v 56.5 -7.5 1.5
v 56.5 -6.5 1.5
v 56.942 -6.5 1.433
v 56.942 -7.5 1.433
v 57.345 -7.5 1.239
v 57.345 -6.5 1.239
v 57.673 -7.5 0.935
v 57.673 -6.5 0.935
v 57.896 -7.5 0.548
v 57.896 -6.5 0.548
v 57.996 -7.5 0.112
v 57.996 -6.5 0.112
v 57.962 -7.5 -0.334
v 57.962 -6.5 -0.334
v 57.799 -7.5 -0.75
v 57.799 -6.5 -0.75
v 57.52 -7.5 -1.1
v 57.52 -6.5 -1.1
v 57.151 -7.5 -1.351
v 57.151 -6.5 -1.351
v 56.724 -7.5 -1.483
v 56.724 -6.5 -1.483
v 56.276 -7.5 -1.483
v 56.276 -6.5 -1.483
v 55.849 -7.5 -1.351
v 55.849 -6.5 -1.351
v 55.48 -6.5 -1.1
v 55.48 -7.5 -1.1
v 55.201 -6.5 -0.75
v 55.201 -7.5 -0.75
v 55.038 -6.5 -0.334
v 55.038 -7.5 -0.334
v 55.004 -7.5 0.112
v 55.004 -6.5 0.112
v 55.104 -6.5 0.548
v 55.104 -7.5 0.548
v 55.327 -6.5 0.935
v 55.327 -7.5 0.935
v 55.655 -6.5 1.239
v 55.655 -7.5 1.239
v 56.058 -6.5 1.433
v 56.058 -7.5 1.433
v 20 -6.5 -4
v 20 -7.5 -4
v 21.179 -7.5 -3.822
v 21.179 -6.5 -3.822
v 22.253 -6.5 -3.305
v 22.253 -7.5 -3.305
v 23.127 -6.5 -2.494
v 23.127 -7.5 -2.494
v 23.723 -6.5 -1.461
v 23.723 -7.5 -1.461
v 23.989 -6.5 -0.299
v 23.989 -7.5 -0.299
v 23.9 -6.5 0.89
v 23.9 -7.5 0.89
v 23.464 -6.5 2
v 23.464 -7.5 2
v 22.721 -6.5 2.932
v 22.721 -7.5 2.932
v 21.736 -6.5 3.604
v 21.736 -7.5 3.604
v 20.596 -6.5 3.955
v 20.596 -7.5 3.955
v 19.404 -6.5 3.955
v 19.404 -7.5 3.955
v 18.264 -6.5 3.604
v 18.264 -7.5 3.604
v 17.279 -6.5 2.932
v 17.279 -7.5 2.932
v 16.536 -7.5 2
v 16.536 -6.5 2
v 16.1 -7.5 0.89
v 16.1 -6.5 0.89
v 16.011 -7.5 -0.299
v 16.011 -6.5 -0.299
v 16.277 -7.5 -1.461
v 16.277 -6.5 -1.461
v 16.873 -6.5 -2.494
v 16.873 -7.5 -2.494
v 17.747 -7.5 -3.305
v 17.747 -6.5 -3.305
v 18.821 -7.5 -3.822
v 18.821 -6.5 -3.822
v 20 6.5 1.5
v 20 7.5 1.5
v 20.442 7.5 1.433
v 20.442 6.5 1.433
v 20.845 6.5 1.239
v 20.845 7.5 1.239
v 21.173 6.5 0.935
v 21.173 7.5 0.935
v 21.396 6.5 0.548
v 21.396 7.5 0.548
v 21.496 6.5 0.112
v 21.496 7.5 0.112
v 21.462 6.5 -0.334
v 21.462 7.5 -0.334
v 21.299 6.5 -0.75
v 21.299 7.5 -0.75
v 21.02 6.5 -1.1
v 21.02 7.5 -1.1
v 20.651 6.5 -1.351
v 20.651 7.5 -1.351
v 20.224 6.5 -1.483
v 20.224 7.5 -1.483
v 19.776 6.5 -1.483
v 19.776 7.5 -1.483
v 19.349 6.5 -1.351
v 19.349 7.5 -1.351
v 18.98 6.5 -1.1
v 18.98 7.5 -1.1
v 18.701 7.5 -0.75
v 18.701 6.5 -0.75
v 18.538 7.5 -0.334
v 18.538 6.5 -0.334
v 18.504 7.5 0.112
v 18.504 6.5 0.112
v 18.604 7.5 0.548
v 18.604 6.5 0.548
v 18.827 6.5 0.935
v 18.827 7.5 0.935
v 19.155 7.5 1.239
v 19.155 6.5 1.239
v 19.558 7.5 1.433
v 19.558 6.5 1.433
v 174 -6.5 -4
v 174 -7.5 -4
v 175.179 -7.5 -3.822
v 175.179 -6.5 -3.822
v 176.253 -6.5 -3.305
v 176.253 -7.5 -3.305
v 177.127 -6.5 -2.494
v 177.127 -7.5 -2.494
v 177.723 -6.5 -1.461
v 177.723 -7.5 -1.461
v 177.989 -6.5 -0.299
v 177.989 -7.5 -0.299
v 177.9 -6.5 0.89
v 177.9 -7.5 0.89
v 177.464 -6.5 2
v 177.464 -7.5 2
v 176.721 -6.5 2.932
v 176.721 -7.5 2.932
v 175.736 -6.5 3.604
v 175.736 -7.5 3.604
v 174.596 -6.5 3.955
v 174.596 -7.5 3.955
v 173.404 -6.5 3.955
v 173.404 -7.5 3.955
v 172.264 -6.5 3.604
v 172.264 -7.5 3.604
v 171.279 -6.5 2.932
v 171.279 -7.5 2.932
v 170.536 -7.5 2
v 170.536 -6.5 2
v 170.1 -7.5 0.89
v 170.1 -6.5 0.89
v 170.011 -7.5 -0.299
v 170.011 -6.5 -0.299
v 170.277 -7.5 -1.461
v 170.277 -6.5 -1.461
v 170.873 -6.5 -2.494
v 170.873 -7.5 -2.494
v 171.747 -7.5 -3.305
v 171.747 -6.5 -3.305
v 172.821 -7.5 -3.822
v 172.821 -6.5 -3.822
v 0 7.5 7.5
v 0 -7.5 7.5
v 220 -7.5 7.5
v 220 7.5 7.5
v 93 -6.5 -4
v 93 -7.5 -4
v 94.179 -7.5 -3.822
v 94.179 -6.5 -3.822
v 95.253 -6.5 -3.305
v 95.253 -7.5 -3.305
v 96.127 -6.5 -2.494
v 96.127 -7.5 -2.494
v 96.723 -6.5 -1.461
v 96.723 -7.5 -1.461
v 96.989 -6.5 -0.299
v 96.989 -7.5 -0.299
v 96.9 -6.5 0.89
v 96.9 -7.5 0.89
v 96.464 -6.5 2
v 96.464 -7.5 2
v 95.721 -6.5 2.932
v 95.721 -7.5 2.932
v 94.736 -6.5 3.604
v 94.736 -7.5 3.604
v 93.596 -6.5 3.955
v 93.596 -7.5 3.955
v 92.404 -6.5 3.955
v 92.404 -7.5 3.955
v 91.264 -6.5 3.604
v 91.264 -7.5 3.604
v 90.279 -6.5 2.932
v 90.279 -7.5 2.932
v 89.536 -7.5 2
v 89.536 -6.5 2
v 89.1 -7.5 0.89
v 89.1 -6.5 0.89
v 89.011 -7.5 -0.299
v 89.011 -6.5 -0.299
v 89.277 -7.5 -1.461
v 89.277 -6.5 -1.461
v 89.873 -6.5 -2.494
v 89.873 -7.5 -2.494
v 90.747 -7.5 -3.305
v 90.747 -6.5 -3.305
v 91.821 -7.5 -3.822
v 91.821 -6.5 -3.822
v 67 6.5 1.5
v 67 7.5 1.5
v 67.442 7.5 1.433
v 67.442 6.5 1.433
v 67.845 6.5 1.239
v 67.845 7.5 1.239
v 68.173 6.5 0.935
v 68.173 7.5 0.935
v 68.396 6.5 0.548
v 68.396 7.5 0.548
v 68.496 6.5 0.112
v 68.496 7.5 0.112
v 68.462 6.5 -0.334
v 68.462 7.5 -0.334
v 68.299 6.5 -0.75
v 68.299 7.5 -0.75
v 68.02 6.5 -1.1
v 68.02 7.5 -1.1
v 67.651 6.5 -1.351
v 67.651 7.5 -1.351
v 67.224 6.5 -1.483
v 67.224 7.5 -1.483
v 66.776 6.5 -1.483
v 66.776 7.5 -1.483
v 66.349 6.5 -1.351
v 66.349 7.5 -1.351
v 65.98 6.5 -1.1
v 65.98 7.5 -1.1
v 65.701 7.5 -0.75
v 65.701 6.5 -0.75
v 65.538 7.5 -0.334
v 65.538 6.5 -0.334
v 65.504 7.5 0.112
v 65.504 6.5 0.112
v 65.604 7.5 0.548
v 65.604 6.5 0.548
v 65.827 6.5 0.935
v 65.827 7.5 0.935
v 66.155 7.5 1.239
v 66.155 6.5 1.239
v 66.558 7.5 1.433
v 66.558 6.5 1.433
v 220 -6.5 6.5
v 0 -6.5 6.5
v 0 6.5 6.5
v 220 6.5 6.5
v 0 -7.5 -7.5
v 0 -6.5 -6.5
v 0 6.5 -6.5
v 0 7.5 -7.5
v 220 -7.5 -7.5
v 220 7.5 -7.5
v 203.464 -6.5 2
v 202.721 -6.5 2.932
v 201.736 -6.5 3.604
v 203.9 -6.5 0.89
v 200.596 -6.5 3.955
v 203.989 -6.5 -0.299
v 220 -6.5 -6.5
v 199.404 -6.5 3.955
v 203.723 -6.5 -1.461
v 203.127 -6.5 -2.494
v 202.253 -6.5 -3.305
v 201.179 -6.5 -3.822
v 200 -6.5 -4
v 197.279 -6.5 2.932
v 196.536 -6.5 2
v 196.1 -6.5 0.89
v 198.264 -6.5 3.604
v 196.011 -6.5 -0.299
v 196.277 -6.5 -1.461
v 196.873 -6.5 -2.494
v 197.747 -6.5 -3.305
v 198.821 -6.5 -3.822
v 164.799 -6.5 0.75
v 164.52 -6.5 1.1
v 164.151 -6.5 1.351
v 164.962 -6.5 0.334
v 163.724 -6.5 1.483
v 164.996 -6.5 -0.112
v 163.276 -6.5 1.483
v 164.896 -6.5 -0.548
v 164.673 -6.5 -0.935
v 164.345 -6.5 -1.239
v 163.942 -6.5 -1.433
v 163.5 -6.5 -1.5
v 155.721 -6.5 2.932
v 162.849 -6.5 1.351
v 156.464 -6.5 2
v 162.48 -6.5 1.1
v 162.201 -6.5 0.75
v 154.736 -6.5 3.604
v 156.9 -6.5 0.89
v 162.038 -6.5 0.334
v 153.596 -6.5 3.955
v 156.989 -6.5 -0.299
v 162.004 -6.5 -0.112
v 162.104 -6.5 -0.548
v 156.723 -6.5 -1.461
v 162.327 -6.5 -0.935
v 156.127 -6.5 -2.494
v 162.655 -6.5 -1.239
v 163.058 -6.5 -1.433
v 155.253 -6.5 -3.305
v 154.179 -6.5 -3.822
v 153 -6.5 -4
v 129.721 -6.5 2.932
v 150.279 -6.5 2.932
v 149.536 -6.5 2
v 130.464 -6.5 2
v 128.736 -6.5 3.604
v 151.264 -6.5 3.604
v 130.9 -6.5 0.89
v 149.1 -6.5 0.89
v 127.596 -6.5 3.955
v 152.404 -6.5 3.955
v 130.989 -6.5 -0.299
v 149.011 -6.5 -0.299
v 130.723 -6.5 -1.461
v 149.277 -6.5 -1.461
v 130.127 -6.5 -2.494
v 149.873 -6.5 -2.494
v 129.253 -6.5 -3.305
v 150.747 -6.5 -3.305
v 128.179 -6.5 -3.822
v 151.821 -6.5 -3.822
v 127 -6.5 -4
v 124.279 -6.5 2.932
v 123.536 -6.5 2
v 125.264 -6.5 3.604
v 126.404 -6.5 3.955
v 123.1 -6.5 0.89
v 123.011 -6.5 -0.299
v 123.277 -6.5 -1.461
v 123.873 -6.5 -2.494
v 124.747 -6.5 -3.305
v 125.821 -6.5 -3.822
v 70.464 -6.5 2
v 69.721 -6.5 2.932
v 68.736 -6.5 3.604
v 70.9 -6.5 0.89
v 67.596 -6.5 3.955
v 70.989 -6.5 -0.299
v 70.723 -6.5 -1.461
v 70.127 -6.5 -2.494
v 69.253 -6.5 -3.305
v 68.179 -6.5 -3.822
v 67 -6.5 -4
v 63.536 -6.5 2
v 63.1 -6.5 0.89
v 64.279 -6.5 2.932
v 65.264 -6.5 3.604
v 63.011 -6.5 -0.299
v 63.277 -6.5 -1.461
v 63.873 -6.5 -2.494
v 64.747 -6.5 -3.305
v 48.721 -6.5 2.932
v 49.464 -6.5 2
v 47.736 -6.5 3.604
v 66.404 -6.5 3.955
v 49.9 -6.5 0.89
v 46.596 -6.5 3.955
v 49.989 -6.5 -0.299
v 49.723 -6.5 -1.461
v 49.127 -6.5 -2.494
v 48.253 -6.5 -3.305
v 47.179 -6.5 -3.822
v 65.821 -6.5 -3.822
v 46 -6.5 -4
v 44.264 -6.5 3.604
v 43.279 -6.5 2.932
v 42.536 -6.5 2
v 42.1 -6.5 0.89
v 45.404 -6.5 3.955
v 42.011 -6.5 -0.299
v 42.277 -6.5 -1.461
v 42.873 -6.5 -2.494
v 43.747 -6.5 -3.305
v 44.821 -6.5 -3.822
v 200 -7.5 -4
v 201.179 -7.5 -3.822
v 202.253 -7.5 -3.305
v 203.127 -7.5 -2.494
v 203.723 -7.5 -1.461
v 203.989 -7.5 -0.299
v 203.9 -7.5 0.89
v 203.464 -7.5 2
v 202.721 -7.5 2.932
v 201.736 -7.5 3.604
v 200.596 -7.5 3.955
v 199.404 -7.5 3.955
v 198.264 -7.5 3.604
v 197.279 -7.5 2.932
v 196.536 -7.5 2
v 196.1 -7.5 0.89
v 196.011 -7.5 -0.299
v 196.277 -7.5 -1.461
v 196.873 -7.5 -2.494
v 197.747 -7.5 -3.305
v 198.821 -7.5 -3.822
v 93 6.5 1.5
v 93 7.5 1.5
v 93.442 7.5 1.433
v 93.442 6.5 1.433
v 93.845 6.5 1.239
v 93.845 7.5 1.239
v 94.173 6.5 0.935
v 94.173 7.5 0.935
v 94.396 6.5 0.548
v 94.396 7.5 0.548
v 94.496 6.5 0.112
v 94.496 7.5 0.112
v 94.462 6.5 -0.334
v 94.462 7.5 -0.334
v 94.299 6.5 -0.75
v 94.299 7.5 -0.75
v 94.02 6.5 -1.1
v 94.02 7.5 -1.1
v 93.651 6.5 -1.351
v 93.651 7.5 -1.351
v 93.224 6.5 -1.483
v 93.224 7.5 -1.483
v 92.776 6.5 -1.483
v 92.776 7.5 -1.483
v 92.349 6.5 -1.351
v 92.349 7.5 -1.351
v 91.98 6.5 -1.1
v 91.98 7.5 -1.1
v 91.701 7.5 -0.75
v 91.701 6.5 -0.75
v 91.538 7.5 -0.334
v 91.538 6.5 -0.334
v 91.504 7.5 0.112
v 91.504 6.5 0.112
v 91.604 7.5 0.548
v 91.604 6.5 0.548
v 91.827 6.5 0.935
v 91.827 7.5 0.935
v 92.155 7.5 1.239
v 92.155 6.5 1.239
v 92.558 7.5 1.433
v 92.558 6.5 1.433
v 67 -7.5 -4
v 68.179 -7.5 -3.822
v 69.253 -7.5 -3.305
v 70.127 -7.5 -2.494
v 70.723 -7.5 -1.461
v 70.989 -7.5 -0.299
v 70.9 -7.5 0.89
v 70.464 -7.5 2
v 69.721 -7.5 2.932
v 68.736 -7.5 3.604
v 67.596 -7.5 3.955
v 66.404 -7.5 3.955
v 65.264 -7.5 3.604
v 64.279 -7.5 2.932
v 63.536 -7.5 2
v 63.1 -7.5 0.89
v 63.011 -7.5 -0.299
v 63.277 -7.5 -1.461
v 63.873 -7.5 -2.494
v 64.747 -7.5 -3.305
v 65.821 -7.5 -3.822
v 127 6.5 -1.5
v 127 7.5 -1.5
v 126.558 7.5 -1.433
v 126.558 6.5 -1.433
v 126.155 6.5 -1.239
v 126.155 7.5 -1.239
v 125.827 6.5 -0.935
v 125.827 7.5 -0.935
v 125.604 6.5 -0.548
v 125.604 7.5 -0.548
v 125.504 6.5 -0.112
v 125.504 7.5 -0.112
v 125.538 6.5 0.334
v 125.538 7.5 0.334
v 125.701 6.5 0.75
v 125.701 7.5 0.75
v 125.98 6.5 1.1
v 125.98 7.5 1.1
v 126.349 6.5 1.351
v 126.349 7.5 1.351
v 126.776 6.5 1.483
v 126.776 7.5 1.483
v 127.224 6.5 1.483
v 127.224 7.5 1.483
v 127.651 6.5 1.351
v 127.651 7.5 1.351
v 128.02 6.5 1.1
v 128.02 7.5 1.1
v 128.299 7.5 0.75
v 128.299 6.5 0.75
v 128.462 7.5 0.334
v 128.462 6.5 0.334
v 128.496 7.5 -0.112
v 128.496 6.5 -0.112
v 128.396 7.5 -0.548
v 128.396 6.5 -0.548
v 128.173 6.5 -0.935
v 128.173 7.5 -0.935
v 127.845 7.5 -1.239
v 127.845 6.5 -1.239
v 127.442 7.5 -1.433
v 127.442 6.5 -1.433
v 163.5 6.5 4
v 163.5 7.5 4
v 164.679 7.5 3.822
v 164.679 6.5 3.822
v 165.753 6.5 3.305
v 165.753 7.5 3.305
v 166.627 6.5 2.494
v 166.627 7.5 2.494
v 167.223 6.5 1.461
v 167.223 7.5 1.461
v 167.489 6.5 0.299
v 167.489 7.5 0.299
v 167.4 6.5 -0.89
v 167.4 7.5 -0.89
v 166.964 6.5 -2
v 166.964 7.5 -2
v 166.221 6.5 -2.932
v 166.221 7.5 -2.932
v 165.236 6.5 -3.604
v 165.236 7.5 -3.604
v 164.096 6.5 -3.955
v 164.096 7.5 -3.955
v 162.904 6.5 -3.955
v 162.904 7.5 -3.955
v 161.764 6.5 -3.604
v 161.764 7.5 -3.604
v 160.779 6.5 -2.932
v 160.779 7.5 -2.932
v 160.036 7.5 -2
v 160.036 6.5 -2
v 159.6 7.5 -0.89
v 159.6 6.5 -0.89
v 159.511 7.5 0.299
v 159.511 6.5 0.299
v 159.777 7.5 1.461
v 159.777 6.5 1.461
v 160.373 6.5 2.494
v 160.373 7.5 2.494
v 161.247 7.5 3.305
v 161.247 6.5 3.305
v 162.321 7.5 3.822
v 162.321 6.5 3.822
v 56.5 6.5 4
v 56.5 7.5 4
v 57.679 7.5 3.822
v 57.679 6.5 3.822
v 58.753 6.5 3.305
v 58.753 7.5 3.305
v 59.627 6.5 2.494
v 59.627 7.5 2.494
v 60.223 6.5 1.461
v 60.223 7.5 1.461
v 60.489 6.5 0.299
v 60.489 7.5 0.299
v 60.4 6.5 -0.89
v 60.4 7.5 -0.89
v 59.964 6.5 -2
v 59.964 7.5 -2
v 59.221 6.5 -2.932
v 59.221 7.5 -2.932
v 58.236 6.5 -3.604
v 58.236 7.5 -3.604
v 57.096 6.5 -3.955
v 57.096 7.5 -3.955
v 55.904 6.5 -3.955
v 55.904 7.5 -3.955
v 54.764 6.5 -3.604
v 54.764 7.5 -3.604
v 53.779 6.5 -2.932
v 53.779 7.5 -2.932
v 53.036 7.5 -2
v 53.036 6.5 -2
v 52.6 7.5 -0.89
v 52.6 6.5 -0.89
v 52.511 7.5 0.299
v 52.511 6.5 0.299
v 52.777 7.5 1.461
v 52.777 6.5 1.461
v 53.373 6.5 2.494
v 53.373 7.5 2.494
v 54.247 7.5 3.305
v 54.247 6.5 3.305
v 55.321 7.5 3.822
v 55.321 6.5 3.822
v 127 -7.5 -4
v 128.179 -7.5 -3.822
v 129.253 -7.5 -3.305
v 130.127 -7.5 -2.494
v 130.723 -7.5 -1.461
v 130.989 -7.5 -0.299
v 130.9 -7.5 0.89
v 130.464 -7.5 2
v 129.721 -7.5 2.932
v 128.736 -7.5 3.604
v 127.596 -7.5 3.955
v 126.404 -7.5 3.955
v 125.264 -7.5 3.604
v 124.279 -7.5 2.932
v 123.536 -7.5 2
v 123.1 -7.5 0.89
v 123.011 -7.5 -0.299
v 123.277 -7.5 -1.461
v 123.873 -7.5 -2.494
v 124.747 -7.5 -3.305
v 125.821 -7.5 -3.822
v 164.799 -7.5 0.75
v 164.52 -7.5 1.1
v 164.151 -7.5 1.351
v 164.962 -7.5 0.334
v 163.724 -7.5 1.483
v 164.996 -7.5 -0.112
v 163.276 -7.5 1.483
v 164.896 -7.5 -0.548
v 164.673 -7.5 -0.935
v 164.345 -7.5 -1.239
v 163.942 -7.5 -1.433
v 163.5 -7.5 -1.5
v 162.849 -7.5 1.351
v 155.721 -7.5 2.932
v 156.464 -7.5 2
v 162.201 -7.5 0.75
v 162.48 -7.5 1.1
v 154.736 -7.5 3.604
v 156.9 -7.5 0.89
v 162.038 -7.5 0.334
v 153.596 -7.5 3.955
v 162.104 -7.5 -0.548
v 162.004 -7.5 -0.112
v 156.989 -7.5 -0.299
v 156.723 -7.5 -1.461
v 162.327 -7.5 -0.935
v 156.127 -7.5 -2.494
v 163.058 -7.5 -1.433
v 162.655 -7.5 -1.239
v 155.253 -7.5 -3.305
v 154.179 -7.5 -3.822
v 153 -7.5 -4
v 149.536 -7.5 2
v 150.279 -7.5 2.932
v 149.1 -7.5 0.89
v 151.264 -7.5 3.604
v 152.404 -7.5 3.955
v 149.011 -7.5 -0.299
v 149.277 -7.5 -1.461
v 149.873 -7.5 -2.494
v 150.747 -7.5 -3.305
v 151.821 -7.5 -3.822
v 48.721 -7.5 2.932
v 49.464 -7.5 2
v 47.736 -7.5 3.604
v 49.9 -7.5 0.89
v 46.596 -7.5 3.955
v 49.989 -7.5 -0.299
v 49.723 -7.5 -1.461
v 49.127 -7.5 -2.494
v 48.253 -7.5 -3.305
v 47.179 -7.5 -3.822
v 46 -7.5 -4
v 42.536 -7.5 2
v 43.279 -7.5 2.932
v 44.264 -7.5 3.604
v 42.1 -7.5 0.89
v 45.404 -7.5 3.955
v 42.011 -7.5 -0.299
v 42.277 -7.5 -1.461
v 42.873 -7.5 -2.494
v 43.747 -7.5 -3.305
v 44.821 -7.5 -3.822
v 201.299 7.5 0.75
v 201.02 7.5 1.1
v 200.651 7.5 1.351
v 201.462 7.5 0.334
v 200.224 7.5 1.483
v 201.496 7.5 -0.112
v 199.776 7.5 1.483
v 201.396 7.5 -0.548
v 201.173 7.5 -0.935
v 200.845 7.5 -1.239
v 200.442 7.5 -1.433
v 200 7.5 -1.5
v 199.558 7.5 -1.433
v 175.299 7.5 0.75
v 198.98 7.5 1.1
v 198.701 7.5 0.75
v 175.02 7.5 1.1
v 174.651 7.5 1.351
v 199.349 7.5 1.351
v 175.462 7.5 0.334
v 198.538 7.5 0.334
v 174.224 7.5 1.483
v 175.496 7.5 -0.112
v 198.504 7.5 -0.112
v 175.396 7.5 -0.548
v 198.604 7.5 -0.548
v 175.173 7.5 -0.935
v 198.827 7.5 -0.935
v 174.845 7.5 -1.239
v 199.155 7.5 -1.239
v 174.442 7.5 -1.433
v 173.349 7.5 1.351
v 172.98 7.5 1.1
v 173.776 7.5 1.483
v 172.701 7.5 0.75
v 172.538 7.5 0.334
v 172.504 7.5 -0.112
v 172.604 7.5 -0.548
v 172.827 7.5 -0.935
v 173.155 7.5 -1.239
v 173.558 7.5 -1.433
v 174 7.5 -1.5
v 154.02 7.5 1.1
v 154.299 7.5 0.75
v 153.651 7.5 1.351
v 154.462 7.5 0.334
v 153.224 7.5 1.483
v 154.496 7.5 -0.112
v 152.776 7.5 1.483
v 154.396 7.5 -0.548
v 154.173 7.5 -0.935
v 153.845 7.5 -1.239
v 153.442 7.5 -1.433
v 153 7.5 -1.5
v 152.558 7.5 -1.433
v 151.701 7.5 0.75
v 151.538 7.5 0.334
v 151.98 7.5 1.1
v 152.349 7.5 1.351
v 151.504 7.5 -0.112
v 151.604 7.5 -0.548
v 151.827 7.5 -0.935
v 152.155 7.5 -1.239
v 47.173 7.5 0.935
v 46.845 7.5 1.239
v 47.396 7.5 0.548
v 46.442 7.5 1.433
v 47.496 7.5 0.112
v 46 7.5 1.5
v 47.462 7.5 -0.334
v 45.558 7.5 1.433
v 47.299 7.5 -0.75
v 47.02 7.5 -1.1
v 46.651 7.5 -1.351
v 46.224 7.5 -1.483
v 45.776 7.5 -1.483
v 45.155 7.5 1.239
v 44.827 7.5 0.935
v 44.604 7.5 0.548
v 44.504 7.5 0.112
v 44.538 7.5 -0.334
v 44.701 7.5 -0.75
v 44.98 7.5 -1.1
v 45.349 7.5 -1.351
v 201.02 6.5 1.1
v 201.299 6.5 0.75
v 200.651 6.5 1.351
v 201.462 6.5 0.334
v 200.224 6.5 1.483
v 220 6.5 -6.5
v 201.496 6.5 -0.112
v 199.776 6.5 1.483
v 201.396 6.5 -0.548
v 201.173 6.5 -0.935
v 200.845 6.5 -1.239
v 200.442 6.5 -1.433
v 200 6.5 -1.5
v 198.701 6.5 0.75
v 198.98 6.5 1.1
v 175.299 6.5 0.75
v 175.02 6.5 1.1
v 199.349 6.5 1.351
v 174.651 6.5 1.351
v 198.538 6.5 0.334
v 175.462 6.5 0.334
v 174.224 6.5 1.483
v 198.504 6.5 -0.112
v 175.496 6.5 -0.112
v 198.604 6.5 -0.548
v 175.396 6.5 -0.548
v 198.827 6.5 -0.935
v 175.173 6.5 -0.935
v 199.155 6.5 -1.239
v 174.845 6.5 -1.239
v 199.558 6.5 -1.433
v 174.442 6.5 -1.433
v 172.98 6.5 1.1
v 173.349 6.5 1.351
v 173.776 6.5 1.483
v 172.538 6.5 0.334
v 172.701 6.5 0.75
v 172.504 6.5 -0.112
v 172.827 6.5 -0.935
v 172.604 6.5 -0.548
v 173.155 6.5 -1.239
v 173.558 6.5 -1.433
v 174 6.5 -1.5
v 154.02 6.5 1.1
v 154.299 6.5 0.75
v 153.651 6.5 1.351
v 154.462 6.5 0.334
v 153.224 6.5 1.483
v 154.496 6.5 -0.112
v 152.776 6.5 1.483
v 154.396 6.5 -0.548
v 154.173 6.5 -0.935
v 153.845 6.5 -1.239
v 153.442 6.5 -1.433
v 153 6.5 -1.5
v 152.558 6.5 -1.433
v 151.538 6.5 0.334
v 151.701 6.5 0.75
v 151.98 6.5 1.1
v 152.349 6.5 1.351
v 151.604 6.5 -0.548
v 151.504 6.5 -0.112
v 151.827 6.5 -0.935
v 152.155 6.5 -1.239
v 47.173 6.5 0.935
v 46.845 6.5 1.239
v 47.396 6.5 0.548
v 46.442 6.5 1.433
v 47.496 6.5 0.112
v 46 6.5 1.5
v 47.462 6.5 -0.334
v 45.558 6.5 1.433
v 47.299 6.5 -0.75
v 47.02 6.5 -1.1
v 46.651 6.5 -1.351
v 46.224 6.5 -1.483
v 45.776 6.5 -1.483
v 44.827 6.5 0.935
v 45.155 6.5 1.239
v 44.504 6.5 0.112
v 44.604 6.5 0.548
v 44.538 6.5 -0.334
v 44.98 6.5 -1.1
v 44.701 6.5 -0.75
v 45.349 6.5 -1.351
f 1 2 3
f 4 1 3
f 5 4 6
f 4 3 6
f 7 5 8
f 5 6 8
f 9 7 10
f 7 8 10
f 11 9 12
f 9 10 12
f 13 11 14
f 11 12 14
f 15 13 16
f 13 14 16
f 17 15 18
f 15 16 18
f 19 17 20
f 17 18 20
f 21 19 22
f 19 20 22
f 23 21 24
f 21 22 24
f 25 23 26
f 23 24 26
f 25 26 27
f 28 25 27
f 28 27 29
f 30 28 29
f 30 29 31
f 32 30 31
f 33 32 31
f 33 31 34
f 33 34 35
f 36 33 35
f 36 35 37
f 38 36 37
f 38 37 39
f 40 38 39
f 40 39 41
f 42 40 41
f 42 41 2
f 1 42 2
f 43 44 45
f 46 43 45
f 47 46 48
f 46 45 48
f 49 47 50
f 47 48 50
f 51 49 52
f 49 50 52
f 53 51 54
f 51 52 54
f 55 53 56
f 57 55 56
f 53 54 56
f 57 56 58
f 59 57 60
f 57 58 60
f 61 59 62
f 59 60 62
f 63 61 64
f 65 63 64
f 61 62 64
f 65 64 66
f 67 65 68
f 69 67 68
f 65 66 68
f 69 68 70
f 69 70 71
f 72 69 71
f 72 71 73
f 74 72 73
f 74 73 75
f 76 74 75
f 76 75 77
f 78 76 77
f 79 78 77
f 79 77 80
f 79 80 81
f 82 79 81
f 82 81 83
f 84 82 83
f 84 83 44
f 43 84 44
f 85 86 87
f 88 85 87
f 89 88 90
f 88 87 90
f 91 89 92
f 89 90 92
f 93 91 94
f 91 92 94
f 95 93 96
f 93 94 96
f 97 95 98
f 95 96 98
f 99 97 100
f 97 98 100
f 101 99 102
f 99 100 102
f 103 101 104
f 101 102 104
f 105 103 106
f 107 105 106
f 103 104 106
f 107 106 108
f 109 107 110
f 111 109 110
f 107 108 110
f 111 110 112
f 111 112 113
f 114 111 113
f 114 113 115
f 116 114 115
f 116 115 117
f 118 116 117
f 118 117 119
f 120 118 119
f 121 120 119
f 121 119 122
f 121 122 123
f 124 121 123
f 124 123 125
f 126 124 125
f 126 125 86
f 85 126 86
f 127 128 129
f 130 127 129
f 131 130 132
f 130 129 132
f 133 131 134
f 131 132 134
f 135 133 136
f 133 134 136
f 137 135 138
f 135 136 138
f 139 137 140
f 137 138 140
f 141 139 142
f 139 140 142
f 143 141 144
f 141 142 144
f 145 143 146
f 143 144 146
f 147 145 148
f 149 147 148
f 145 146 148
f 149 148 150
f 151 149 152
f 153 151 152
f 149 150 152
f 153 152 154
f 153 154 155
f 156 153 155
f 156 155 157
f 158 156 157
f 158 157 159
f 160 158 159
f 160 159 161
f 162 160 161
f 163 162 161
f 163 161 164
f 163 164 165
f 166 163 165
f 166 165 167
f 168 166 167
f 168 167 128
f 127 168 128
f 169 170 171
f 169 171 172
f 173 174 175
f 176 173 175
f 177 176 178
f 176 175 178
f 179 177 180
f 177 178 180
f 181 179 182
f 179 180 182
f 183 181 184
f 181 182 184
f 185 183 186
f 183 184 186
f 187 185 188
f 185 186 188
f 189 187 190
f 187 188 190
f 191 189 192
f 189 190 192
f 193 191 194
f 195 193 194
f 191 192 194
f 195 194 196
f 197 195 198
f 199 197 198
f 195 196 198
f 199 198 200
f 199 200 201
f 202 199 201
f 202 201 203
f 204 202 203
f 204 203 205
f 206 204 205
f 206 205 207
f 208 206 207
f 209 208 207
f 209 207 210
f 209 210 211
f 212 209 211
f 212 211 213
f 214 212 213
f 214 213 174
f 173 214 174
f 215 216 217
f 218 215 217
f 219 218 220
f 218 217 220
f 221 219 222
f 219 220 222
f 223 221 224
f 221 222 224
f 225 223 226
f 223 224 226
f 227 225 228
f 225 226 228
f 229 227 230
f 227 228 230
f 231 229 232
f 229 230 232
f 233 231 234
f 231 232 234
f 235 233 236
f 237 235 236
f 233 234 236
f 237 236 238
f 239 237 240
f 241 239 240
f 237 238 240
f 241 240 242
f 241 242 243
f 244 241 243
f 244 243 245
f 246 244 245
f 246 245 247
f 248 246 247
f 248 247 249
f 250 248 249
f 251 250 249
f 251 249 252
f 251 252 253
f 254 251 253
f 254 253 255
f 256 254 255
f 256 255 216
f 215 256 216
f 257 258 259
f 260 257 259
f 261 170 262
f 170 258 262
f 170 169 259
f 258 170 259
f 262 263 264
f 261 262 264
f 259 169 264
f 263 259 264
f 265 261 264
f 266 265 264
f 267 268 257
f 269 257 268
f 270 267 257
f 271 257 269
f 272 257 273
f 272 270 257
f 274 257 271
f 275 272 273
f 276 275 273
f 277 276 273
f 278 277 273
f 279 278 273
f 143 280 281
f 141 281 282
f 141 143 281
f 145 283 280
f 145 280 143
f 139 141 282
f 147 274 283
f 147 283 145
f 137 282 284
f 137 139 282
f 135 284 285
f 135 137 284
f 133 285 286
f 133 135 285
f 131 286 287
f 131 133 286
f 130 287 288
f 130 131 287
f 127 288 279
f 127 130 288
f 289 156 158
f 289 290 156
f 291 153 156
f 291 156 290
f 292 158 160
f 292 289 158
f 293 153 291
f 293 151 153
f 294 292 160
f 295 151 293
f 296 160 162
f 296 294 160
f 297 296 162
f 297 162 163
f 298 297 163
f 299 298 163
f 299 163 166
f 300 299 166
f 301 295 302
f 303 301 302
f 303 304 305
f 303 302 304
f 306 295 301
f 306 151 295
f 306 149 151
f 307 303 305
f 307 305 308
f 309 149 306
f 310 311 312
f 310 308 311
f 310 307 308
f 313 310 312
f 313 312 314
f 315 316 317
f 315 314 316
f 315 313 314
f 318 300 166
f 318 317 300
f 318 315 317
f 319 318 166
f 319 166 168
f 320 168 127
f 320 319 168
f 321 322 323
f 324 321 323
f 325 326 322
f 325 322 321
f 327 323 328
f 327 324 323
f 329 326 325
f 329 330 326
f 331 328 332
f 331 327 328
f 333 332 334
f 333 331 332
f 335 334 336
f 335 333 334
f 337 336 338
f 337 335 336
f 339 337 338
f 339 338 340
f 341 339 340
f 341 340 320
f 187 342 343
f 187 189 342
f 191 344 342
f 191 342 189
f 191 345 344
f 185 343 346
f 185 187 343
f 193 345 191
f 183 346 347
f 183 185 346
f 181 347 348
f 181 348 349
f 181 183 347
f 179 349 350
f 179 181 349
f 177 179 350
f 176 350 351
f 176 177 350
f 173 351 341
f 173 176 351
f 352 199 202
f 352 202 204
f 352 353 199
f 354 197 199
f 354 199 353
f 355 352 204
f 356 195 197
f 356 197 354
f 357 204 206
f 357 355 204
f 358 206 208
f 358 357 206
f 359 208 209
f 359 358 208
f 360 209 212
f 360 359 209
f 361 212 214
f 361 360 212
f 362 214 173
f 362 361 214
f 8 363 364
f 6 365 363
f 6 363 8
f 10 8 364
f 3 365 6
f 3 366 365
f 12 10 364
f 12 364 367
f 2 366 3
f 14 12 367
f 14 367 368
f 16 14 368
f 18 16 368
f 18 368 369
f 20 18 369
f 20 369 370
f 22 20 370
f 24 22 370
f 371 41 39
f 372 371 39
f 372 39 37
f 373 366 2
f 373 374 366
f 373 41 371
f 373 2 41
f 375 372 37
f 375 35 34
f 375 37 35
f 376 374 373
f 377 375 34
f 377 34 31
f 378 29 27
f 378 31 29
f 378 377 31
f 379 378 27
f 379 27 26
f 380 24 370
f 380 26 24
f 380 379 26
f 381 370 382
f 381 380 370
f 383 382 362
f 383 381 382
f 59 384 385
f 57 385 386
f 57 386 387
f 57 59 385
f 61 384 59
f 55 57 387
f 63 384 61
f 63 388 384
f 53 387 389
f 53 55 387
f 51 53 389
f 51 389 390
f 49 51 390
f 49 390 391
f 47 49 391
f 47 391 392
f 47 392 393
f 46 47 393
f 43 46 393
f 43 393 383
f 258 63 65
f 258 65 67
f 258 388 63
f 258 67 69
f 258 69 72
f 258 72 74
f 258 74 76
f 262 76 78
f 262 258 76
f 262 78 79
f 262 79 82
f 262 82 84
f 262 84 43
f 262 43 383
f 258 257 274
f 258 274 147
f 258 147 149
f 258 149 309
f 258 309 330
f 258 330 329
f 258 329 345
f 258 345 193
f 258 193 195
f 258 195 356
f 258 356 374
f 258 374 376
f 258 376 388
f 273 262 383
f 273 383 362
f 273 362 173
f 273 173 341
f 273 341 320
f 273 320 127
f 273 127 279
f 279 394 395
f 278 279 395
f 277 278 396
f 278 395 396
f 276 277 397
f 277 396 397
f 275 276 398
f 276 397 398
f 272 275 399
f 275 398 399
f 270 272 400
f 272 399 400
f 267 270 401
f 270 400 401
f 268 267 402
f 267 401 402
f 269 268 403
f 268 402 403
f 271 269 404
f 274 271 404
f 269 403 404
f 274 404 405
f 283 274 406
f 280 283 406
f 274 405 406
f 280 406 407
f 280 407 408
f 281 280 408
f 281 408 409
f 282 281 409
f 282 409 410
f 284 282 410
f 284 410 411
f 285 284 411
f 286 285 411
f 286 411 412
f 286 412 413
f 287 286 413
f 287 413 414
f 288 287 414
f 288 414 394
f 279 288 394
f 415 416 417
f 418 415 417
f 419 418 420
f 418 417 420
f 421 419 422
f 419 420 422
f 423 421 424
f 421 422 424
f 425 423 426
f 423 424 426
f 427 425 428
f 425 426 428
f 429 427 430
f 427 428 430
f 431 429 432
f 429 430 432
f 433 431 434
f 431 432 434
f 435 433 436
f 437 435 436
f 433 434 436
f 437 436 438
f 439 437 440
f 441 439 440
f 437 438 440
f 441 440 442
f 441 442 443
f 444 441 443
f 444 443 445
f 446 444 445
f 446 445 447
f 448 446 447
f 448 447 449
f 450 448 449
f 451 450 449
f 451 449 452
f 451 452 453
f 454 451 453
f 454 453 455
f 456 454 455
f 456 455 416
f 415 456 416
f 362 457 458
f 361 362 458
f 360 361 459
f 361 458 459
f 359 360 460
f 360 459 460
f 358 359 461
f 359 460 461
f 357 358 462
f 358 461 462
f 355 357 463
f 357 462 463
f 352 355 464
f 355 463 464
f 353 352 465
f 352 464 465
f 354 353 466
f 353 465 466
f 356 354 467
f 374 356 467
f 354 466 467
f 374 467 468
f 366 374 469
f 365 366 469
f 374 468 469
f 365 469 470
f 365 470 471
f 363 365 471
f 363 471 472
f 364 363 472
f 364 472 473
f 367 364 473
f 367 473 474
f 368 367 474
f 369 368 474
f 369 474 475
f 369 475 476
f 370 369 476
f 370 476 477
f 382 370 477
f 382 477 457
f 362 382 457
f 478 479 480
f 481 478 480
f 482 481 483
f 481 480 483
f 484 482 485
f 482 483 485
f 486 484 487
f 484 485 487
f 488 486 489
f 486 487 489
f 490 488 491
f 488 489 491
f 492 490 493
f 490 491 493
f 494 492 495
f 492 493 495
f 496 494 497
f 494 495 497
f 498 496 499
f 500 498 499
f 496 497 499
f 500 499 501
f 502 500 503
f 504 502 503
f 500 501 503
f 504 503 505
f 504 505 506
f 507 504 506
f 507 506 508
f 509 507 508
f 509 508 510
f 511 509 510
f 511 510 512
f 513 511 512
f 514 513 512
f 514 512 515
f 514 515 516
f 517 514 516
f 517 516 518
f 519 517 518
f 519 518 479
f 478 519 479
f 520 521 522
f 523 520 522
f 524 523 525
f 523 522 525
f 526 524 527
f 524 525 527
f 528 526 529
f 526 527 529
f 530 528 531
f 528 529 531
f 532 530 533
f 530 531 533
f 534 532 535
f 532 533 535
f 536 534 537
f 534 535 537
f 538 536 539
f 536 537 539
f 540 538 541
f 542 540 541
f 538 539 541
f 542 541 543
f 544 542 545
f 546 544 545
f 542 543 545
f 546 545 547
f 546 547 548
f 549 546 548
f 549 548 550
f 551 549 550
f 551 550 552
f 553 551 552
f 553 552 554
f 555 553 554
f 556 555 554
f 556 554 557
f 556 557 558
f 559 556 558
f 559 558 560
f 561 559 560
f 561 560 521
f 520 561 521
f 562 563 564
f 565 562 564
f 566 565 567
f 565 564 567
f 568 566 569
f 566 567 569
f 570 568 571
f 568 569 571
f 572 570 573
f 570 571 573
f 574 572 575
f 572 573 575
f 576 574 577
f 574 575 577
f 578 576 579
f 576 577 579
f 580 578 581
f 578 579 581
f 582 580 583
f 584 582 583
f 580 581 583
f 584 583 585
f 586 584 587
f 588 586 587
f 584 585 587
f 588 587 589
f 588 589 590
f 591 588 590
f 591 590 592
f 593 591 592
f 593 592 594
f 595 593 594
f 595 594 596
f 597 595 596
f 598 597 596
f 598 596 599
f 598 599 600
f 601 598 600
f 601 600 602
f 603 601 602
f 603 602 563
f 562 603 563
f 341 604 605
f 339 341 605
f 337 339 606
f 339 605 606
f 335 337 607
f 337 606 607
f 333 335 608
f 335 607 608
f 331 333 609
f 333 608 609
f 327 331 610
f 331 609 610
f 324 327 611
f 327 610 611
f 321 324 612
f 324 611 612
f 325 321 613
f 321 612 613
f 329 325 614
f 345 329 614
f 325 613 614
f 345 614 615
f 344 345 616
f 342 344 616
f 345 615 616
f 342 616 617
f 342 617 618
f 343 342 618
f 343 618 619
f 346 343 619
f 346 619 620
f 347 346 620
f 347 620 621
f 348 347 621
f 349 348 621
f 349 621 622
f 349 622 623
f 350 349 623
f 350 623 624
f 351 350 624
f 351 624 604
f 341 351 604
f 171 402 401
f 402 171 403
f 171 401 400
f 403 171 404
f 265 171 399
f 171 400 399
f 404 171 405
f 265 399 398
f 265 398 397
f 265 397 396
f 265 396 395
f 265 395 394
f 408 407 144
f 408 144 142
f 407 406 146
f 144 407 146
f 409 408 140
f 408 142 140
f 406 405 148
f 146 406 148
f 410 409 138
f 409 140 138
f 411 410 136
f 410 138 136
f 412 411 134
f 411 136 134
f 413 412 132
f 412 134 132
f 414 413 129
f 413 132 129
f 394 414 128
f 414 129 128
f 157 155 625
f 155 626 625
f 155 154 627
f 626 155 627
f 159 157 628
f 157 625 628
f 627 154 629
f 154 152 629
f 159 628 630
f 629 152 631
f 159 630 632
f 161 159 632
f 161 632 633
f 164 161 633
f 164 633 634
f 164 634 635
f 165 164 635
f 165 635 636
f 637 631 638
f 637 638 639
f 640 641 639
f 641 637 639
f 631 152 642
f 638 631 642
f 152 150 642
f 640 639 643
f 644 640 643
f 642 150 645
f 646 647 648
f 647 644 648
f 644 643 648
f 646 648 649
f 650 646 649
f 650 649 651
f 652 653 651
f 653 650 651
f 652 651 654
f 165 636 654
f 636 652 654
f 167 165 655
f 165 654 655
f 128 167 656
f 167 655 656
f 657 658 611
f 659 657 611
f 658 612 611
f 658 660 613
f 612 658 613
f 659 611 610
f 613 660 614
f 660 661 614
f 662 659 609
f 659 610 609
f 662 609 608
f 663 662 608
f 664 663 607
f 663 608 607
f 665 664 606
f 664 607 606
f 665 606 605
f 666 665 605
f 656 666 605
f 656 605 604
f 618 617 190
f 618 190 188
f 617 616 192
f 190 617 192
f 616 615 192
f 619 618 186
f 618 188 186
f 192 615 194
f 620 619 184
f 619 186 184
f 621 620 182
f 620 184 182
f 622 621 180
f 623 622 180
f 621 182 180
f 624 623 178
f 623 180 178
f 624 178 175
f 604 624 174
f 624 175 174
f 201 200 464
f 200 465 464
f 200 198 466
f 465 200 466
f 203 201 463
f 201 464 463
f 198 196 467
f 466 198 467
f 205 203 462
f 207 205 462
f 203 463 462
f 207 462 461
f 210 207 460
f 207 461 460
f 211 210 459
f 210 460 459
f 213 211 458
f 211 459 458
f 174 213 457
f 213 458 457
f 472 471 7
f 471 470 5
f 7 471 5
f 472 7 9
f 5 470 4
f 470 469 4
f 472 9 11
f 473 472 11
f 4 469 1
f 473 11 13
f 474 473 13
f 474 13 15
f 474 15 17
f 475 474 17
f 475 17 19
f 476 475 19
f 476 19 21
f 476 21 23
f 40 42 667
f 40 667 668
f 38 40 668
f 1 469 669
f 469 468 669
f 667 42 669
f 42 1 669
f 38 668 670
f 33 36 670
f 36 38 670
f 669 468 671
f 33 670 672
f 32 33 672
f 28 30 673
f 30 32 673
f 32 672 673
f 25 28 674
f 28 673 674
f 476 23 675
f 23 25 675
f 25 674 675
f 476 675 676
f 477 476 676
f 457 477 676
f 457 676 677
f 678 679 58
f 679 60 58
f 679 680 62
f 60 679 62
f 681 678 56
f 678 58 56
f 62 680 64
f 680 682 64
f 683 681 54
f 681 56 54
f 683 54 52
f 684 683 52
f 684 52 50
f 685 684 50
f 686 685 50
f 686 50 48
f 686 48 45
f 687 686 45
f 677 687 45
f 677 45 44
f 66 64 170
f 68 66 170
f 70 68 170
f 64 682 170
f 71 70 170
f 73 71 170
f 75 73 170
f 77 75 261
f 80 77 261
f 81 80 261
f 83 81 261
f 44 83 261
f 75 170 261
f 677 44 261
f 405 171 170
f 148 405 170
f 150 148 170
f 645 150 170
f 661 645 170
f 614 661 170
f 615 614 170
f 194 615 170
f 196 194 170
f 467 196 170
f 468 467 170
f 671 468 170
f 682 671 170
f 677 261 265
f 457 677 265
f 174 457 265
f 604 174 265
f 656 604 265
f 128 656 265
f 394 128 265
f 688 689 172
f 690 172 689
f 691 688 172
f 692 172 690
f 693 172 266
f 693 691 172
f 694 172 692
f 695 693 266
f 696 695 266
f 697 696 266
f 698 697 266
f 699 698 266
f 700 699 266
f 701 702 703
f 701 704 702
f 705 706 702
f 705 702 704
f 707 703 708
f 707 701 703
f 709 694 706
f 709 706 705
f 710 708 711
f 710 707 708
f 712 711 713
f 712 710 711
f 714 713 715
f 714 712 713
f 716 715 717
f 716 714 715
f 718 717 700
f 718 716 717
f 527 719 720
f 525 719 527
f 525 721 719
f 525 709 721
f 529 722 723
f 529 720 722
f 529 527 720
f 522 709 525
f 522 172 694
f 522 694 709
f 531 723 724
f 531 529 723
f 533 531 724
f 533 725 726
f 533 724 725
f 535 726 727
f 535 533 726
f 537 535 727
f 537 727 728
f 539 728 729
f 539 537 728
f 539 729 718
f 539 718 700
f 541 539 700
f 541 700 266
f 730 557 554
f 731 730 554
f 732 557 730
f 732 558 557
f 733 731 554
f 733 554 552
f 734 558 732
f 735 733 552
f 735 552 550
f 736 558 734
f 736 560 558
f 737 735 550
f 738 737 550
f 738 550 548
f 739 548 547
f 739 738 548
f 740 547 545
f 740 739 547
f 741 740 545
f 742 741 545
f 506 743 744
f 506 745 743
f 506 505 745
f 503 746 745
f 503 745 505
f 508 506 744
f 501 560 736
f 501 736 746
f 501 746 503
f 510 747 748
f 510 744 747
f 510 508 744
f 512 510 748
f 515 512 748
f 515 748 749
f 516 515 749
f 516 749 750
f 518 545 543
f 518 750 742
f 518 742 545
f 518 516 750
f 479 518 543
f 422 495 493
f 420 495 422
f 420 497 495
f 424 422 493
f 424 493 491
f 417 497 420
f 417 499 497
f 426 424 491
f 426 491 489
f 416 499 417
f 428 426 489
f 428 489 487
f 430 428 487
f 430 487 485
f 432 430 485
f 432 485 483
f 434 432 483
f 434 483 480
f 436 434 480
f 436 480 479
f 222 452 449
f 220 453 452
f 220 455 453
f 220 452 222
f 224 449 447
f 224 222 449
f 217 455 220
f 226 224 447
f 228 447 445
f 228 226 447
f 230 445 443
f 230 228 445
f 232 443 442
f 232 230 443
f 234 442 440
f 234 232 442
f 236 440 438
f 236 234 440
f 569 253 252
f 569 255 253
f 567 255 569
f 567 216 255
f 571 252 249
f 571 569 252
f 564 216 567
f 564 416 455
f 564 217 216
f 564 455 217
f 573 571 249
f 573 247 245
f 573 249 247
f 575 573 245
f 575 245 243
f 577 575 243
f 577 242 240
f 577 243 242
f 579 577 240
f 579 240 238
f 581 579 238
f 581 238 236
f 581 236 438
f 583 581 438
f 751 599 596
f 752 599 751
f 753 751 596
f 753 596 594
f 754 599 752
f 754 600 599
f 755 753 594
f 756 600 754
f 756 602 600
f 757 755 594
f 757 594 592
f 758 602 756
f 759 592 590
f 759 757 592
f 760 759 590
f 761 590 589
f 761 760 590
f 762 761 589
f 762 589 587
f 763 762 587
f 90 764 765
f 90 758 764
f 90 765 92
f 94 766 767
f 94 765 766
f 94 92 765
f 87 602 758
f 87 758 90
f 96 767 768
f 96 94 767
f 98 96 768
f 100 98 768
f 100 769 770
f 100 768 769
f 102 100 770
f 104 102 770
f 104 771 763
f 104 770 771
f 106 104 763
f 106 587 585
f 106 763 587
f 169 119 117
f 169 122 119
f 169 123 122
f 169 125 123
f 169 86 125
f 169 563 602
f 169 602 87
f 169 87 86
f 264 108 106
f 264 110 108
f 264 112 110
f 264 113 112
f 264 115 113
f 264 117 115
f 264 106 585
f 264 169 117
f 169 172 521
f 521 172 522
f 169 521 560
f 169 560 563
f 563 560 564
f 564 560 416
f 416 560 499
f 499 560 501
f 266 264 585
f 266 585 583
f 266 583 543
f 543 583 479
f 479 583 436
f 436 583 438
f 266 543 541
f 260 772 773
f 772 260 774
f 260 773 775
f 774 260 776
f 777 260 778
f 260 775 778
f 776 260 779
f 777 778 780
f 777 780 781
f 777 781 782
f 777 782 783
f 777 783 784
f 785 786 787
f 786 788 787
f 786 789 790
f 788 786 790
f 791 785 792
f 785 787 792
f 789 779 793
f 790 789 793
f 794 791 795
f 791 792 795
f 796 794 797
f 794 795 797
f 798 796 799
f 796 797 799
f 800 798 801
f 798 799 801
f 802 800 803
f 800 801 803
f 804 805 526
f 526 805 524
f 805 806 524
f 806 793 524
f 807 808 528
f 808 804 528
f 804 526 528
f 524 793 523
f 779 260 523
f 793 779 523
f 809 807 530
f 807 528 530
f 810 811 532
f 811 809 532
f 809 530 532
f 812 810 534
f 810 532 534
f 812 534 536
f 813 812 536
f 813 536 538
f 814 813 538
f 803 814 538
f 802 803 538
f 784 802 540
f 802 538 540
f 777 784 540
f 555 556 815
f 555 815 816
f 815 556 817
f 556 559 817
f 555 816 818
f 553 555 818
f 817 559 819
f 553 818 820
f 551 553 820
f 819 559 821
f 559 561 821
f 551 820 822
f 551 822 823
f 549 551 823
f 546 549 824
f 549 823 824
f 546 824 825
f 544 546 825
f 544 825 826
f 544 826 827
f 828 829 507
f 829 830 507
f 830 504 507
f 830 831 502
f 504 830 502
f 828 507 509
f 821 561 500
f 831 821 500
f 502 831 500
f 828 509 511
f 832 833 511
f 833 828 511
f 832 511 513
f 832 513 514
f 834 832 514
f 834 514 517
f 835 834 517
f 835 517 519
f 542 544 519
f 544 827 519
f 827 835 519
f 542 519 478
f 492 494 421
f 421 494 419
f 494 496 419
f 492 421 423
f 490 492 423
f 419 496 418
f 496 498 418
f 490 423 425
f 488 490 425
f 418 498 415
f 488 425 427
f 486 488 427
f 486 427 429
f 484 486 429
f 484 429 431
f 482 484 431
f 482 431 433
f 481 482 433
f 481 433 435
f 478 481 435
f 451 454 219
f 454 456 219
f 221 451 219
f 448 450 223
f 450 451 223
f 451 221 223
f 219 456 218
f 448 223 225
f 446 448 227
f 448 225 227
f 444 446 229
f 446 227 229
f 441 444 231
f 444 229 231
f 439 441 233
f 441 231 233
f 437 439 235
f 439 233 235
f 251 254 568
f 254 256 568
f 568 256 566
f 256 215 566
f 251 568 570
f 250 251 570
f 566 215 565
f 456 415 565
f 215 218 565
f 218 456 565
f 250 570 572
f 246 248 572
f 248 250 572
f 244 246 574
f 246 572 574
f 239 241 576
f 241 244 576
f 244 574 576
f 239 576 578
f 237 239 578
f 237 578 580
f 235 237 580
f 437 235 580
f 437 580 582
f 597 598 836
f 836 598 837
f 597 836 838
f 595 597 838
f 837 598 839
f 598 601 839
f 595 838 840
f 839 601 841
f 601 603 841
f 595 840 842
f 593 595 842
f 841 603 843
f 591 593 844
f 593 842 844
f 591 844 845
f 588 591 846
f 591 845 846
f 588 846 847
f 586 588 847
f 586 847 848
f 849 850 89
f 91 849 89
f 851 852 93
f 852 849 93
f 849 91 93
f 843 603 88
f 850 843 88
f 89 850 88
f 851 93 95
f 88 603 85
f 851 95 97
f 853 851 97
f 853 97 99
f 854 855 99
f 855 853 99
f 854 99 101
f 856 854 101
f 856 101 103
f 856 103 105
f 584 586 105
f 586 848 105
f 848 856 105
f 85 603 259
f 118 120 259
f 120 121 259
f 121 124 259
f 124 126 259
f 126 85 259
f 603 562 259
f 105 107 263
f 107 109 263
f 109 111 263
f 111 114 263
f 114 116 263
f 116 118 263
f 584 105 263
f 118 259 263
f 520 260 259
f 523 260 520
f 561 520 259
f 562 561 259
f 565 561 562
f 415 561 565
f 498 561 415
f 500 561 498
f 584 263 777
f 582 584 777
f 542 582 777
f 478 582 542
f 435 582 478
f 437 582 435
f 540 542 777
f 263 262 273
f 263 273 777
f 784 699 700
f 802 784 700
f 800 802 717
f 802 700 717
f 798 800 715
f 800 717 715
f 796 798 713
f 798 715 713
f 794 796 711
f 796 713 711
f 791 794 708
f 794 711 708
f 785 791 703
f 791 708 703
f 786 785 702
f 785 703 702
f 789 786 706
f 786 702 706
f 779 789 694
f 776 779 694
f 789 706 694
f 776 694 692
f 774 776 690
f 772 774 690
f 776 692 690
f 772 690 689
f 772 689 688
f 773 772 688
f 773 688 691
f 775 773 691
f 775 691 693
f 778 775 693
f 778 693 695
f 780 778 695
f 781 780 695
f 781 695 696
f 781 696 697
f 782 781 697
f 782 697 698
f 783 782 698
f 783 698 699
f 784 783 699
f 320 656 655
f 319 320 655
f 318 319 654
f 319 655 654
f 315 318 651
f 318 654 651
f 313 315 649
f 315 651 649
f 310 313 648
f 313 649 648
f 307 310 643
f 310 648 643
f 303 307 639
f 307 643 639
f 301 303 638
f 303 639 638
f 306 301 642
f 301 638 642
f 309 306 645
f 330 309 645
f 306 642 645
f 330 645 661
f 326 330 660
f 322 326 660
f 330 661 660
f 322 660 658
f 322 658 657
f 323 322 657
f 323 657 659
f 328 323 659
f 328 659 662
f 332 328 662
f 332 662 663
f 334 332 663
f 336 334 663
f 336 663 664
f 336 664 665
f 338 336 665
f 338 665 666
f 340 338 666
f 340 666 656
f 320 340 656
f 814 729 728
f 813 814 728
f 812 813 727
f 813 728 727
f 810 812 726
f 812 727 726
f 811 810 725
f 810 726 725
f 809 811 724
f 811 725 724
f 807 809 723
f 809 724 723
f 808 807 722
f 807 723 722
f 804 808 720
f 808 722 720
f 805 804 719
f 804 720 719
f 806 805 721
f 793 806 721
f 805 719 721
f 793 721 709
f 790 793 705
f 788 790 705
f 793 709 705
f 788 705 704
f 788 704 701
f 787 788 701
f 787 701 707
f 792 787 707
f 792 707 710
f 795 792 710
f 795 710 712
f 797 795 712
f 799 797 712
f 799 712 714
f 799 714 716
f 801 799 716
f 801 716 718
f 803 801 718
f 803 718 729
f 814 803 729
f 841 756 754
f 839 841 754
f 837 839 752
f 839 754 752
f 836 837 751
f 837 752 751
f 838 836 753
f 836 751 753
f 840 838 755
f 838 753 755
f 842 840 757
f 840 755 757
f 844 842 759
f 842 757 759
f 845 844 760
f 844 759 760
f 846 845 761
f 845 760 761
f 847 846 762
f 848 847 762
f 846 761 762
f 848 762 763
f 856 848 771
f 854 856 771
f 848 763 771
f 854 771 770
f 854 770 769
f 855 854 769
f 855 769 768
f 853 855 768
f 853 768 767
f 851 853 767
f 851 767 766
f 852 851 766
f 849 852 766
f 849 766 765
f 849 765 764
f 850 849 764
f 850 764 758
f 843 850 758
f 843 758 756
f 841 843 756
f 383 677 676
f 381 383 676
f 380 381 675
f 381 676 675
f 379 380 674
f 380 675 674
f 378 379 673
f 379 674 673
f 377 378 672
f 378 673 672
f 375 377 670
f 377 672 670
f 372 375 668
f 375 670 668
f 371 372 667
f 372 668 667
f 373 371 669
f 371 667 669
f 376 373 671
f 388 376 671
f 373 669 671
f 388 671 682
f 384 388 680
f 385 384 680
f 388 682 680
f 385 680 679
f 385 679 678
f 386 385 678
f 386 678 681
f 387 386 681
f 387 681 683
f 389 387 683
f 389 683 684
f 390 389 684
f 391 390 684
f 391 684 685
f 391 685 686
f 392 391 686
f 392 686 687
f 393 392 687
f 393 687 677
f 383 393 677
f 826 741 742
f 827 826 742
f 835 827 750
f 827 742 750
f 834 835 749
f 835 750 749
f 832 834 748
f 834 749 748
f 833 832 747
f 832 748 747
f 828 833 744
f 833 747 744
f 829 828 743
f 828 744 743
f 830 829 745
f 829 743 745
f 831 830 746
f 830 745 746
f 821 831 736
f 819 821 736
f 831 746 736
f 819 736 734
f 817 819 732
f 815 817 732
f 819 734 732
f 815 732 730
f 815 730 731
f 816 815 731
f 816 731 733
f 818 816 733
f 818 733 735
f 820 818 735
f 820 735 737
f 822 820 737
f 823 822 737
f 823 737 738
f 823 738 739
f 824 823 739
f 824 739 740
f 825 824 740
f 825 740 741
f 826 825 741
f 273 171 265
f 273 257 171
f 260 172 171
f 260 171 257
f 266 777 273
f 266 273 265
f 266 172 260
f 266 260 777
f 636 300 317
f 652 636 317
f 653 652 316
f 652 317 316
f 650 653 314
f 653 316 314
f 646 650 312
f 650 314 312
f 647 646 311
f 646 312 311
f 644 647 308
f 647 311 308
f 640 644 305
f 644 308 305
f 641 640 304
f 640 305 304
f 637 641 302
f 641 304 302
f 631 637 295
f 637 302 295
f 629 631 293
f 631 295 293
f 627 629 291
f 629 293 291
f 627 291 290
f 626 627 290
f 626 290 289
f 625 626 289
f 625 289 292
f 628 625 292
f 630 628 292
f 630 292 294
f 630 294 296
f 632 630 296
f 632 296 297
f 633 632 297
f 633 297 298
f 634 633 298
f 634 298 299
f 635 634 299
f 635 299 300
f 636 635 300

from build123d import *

# Parameters (mm, degrees)
SKETCH_1_W          = 15
SKETCH_1_H          = 15
SKETCH_1_W_2        = 13
SKETCH_1_H_2        = 13
EXTRUDE_1_DEPTH     = 220
SKETCH_2_R          = 1.5
CUT_EXTRUDE_1_DEPTH = 230
SKETCH_3_R          = 4
CUT_EXTRUDE_2_DEPTH = 3
SKETCH_4_R          = 4
CUT_EXTRUDE_3_DEPTH = 3


with BuildPart() as part:
    # 草图1 → 凸台-拉伸1 (new body)
    with BuildSketch(Plane(origin=(0, 0, 0), x_dir=(0, 0, -1), z_dir=(1, 0, 0))):
        Rectangle(SKETCH_1_W, SKETCH_1_H)
        Rectangle(SKETCH_1_W_2, SKETCH_1_H_2, mode=Mode.SUBTRACT)
    extrude(amount=EXTRUDE_1_DEPTH)

    # 草图2 → 切除-拉伸1 (cut)
    with BuildSketch(Plane(origin=(0, 7.5, 0), x_dir=(1, 0, 0), z_dir=(0, 1, 0))):
        with Locations(Location((20, 0, 0), (0, 0, 270))):
            Circle(SKETCH_2_R)
        with Locations(Location((46, 0, 0), (0, 0, 270))):
            Circle(SKETCH_2_R)
        with Locations(Location((56.5, 0, 0), (0, 0, 270))):
            Circle(SKETCH_2_R)
        with Locations(Location((67, 0, 0), (0, 0, 270))):
            Circle(SKETCH_2_R)
        with Locations(Location((93, 0, 0), (0, 0, 270))):
            Circle(SKETCH_2_R)
        with Locations(Location((127, 0, 0), (0, 0, 90))):
            Circle(SKETCH_2_R)
        with Locations(Location((153, 0, 0), (0, 0, 90))):
            Circle(SKETCH_2_R)
        with Locations(Location((163.5, 0, 0), (0, 0, 90))):
            Circle(SKETCH_2_R)
        with Locations(Location((174, 0, 0), (0, 0, 90))):
            Circle(SKETCH_2_R)
        with Locations(Location((200, 0, 0), (0, 0, 90))):
            Circle(SKETCH_2_R)
    extrude(amount=-CUT_EXTRUDE_1_DEPTH, mode=Mode.SUBTRACT)

    # 草图3 → 切除-拉伸2 (cut)
    with BuildSketch(Plane(origin=(0, 7.5, 0), x_dir=(1, 0, 0), z_dir=(0, 1, 0))):
        with Locations(Location((56.5, 0, 0), (0, 0, 270))):
            Circle(SKETCH_3_R)
        with Locations(Location((163.5, 0, 0), (0, 0, 270))):
            Circle(SKETCH_3_R)
    extrude(amount=-CUT_EXTRUDE_2_DEPTH, mode=Mode.SUBTRACT)

    # 草图4 → 切除-拉伸3 (cut)
    with BuildSketch(Plane.XZ.offset(7.5)):
        with Locations(Location((20, 0, 0), (0, 0, 270))):
            Circle(SKETCH_4_R)
        with Locations(Location((46, 0, 0), (0, 0, 270))):
            Circle(SKETCH_4_R)
        with Locations(Location((67, 0, 0), (0, 0, 270))):
            Circle(SKETCH_4_R)
        with Locations(Location((93, 0, 0), (0, 0, 270))):
            Circle(SKETCH_4_R)
        with Locations(Location((127, 0, 0), (0, 0, 270))):
            Circle(SKETCH_4_R)
        with Locations(Location((153, 0, 0), (0, 0, 270))):
            Circle(SKETCH_4_R)
        with Locations(Location((174, 0, 0), (0, 0, 270))):
            Circle(SKETCH_4_R)
        with Locations(Location((200, 0, 0), (0, 0, 270))):
            Circle(SKETCH_4_R)
    extrude(amount=-CUT_EXTRUDE_3_DEPTH, mode=Mode.SUBTRACT)


solid = part.part
